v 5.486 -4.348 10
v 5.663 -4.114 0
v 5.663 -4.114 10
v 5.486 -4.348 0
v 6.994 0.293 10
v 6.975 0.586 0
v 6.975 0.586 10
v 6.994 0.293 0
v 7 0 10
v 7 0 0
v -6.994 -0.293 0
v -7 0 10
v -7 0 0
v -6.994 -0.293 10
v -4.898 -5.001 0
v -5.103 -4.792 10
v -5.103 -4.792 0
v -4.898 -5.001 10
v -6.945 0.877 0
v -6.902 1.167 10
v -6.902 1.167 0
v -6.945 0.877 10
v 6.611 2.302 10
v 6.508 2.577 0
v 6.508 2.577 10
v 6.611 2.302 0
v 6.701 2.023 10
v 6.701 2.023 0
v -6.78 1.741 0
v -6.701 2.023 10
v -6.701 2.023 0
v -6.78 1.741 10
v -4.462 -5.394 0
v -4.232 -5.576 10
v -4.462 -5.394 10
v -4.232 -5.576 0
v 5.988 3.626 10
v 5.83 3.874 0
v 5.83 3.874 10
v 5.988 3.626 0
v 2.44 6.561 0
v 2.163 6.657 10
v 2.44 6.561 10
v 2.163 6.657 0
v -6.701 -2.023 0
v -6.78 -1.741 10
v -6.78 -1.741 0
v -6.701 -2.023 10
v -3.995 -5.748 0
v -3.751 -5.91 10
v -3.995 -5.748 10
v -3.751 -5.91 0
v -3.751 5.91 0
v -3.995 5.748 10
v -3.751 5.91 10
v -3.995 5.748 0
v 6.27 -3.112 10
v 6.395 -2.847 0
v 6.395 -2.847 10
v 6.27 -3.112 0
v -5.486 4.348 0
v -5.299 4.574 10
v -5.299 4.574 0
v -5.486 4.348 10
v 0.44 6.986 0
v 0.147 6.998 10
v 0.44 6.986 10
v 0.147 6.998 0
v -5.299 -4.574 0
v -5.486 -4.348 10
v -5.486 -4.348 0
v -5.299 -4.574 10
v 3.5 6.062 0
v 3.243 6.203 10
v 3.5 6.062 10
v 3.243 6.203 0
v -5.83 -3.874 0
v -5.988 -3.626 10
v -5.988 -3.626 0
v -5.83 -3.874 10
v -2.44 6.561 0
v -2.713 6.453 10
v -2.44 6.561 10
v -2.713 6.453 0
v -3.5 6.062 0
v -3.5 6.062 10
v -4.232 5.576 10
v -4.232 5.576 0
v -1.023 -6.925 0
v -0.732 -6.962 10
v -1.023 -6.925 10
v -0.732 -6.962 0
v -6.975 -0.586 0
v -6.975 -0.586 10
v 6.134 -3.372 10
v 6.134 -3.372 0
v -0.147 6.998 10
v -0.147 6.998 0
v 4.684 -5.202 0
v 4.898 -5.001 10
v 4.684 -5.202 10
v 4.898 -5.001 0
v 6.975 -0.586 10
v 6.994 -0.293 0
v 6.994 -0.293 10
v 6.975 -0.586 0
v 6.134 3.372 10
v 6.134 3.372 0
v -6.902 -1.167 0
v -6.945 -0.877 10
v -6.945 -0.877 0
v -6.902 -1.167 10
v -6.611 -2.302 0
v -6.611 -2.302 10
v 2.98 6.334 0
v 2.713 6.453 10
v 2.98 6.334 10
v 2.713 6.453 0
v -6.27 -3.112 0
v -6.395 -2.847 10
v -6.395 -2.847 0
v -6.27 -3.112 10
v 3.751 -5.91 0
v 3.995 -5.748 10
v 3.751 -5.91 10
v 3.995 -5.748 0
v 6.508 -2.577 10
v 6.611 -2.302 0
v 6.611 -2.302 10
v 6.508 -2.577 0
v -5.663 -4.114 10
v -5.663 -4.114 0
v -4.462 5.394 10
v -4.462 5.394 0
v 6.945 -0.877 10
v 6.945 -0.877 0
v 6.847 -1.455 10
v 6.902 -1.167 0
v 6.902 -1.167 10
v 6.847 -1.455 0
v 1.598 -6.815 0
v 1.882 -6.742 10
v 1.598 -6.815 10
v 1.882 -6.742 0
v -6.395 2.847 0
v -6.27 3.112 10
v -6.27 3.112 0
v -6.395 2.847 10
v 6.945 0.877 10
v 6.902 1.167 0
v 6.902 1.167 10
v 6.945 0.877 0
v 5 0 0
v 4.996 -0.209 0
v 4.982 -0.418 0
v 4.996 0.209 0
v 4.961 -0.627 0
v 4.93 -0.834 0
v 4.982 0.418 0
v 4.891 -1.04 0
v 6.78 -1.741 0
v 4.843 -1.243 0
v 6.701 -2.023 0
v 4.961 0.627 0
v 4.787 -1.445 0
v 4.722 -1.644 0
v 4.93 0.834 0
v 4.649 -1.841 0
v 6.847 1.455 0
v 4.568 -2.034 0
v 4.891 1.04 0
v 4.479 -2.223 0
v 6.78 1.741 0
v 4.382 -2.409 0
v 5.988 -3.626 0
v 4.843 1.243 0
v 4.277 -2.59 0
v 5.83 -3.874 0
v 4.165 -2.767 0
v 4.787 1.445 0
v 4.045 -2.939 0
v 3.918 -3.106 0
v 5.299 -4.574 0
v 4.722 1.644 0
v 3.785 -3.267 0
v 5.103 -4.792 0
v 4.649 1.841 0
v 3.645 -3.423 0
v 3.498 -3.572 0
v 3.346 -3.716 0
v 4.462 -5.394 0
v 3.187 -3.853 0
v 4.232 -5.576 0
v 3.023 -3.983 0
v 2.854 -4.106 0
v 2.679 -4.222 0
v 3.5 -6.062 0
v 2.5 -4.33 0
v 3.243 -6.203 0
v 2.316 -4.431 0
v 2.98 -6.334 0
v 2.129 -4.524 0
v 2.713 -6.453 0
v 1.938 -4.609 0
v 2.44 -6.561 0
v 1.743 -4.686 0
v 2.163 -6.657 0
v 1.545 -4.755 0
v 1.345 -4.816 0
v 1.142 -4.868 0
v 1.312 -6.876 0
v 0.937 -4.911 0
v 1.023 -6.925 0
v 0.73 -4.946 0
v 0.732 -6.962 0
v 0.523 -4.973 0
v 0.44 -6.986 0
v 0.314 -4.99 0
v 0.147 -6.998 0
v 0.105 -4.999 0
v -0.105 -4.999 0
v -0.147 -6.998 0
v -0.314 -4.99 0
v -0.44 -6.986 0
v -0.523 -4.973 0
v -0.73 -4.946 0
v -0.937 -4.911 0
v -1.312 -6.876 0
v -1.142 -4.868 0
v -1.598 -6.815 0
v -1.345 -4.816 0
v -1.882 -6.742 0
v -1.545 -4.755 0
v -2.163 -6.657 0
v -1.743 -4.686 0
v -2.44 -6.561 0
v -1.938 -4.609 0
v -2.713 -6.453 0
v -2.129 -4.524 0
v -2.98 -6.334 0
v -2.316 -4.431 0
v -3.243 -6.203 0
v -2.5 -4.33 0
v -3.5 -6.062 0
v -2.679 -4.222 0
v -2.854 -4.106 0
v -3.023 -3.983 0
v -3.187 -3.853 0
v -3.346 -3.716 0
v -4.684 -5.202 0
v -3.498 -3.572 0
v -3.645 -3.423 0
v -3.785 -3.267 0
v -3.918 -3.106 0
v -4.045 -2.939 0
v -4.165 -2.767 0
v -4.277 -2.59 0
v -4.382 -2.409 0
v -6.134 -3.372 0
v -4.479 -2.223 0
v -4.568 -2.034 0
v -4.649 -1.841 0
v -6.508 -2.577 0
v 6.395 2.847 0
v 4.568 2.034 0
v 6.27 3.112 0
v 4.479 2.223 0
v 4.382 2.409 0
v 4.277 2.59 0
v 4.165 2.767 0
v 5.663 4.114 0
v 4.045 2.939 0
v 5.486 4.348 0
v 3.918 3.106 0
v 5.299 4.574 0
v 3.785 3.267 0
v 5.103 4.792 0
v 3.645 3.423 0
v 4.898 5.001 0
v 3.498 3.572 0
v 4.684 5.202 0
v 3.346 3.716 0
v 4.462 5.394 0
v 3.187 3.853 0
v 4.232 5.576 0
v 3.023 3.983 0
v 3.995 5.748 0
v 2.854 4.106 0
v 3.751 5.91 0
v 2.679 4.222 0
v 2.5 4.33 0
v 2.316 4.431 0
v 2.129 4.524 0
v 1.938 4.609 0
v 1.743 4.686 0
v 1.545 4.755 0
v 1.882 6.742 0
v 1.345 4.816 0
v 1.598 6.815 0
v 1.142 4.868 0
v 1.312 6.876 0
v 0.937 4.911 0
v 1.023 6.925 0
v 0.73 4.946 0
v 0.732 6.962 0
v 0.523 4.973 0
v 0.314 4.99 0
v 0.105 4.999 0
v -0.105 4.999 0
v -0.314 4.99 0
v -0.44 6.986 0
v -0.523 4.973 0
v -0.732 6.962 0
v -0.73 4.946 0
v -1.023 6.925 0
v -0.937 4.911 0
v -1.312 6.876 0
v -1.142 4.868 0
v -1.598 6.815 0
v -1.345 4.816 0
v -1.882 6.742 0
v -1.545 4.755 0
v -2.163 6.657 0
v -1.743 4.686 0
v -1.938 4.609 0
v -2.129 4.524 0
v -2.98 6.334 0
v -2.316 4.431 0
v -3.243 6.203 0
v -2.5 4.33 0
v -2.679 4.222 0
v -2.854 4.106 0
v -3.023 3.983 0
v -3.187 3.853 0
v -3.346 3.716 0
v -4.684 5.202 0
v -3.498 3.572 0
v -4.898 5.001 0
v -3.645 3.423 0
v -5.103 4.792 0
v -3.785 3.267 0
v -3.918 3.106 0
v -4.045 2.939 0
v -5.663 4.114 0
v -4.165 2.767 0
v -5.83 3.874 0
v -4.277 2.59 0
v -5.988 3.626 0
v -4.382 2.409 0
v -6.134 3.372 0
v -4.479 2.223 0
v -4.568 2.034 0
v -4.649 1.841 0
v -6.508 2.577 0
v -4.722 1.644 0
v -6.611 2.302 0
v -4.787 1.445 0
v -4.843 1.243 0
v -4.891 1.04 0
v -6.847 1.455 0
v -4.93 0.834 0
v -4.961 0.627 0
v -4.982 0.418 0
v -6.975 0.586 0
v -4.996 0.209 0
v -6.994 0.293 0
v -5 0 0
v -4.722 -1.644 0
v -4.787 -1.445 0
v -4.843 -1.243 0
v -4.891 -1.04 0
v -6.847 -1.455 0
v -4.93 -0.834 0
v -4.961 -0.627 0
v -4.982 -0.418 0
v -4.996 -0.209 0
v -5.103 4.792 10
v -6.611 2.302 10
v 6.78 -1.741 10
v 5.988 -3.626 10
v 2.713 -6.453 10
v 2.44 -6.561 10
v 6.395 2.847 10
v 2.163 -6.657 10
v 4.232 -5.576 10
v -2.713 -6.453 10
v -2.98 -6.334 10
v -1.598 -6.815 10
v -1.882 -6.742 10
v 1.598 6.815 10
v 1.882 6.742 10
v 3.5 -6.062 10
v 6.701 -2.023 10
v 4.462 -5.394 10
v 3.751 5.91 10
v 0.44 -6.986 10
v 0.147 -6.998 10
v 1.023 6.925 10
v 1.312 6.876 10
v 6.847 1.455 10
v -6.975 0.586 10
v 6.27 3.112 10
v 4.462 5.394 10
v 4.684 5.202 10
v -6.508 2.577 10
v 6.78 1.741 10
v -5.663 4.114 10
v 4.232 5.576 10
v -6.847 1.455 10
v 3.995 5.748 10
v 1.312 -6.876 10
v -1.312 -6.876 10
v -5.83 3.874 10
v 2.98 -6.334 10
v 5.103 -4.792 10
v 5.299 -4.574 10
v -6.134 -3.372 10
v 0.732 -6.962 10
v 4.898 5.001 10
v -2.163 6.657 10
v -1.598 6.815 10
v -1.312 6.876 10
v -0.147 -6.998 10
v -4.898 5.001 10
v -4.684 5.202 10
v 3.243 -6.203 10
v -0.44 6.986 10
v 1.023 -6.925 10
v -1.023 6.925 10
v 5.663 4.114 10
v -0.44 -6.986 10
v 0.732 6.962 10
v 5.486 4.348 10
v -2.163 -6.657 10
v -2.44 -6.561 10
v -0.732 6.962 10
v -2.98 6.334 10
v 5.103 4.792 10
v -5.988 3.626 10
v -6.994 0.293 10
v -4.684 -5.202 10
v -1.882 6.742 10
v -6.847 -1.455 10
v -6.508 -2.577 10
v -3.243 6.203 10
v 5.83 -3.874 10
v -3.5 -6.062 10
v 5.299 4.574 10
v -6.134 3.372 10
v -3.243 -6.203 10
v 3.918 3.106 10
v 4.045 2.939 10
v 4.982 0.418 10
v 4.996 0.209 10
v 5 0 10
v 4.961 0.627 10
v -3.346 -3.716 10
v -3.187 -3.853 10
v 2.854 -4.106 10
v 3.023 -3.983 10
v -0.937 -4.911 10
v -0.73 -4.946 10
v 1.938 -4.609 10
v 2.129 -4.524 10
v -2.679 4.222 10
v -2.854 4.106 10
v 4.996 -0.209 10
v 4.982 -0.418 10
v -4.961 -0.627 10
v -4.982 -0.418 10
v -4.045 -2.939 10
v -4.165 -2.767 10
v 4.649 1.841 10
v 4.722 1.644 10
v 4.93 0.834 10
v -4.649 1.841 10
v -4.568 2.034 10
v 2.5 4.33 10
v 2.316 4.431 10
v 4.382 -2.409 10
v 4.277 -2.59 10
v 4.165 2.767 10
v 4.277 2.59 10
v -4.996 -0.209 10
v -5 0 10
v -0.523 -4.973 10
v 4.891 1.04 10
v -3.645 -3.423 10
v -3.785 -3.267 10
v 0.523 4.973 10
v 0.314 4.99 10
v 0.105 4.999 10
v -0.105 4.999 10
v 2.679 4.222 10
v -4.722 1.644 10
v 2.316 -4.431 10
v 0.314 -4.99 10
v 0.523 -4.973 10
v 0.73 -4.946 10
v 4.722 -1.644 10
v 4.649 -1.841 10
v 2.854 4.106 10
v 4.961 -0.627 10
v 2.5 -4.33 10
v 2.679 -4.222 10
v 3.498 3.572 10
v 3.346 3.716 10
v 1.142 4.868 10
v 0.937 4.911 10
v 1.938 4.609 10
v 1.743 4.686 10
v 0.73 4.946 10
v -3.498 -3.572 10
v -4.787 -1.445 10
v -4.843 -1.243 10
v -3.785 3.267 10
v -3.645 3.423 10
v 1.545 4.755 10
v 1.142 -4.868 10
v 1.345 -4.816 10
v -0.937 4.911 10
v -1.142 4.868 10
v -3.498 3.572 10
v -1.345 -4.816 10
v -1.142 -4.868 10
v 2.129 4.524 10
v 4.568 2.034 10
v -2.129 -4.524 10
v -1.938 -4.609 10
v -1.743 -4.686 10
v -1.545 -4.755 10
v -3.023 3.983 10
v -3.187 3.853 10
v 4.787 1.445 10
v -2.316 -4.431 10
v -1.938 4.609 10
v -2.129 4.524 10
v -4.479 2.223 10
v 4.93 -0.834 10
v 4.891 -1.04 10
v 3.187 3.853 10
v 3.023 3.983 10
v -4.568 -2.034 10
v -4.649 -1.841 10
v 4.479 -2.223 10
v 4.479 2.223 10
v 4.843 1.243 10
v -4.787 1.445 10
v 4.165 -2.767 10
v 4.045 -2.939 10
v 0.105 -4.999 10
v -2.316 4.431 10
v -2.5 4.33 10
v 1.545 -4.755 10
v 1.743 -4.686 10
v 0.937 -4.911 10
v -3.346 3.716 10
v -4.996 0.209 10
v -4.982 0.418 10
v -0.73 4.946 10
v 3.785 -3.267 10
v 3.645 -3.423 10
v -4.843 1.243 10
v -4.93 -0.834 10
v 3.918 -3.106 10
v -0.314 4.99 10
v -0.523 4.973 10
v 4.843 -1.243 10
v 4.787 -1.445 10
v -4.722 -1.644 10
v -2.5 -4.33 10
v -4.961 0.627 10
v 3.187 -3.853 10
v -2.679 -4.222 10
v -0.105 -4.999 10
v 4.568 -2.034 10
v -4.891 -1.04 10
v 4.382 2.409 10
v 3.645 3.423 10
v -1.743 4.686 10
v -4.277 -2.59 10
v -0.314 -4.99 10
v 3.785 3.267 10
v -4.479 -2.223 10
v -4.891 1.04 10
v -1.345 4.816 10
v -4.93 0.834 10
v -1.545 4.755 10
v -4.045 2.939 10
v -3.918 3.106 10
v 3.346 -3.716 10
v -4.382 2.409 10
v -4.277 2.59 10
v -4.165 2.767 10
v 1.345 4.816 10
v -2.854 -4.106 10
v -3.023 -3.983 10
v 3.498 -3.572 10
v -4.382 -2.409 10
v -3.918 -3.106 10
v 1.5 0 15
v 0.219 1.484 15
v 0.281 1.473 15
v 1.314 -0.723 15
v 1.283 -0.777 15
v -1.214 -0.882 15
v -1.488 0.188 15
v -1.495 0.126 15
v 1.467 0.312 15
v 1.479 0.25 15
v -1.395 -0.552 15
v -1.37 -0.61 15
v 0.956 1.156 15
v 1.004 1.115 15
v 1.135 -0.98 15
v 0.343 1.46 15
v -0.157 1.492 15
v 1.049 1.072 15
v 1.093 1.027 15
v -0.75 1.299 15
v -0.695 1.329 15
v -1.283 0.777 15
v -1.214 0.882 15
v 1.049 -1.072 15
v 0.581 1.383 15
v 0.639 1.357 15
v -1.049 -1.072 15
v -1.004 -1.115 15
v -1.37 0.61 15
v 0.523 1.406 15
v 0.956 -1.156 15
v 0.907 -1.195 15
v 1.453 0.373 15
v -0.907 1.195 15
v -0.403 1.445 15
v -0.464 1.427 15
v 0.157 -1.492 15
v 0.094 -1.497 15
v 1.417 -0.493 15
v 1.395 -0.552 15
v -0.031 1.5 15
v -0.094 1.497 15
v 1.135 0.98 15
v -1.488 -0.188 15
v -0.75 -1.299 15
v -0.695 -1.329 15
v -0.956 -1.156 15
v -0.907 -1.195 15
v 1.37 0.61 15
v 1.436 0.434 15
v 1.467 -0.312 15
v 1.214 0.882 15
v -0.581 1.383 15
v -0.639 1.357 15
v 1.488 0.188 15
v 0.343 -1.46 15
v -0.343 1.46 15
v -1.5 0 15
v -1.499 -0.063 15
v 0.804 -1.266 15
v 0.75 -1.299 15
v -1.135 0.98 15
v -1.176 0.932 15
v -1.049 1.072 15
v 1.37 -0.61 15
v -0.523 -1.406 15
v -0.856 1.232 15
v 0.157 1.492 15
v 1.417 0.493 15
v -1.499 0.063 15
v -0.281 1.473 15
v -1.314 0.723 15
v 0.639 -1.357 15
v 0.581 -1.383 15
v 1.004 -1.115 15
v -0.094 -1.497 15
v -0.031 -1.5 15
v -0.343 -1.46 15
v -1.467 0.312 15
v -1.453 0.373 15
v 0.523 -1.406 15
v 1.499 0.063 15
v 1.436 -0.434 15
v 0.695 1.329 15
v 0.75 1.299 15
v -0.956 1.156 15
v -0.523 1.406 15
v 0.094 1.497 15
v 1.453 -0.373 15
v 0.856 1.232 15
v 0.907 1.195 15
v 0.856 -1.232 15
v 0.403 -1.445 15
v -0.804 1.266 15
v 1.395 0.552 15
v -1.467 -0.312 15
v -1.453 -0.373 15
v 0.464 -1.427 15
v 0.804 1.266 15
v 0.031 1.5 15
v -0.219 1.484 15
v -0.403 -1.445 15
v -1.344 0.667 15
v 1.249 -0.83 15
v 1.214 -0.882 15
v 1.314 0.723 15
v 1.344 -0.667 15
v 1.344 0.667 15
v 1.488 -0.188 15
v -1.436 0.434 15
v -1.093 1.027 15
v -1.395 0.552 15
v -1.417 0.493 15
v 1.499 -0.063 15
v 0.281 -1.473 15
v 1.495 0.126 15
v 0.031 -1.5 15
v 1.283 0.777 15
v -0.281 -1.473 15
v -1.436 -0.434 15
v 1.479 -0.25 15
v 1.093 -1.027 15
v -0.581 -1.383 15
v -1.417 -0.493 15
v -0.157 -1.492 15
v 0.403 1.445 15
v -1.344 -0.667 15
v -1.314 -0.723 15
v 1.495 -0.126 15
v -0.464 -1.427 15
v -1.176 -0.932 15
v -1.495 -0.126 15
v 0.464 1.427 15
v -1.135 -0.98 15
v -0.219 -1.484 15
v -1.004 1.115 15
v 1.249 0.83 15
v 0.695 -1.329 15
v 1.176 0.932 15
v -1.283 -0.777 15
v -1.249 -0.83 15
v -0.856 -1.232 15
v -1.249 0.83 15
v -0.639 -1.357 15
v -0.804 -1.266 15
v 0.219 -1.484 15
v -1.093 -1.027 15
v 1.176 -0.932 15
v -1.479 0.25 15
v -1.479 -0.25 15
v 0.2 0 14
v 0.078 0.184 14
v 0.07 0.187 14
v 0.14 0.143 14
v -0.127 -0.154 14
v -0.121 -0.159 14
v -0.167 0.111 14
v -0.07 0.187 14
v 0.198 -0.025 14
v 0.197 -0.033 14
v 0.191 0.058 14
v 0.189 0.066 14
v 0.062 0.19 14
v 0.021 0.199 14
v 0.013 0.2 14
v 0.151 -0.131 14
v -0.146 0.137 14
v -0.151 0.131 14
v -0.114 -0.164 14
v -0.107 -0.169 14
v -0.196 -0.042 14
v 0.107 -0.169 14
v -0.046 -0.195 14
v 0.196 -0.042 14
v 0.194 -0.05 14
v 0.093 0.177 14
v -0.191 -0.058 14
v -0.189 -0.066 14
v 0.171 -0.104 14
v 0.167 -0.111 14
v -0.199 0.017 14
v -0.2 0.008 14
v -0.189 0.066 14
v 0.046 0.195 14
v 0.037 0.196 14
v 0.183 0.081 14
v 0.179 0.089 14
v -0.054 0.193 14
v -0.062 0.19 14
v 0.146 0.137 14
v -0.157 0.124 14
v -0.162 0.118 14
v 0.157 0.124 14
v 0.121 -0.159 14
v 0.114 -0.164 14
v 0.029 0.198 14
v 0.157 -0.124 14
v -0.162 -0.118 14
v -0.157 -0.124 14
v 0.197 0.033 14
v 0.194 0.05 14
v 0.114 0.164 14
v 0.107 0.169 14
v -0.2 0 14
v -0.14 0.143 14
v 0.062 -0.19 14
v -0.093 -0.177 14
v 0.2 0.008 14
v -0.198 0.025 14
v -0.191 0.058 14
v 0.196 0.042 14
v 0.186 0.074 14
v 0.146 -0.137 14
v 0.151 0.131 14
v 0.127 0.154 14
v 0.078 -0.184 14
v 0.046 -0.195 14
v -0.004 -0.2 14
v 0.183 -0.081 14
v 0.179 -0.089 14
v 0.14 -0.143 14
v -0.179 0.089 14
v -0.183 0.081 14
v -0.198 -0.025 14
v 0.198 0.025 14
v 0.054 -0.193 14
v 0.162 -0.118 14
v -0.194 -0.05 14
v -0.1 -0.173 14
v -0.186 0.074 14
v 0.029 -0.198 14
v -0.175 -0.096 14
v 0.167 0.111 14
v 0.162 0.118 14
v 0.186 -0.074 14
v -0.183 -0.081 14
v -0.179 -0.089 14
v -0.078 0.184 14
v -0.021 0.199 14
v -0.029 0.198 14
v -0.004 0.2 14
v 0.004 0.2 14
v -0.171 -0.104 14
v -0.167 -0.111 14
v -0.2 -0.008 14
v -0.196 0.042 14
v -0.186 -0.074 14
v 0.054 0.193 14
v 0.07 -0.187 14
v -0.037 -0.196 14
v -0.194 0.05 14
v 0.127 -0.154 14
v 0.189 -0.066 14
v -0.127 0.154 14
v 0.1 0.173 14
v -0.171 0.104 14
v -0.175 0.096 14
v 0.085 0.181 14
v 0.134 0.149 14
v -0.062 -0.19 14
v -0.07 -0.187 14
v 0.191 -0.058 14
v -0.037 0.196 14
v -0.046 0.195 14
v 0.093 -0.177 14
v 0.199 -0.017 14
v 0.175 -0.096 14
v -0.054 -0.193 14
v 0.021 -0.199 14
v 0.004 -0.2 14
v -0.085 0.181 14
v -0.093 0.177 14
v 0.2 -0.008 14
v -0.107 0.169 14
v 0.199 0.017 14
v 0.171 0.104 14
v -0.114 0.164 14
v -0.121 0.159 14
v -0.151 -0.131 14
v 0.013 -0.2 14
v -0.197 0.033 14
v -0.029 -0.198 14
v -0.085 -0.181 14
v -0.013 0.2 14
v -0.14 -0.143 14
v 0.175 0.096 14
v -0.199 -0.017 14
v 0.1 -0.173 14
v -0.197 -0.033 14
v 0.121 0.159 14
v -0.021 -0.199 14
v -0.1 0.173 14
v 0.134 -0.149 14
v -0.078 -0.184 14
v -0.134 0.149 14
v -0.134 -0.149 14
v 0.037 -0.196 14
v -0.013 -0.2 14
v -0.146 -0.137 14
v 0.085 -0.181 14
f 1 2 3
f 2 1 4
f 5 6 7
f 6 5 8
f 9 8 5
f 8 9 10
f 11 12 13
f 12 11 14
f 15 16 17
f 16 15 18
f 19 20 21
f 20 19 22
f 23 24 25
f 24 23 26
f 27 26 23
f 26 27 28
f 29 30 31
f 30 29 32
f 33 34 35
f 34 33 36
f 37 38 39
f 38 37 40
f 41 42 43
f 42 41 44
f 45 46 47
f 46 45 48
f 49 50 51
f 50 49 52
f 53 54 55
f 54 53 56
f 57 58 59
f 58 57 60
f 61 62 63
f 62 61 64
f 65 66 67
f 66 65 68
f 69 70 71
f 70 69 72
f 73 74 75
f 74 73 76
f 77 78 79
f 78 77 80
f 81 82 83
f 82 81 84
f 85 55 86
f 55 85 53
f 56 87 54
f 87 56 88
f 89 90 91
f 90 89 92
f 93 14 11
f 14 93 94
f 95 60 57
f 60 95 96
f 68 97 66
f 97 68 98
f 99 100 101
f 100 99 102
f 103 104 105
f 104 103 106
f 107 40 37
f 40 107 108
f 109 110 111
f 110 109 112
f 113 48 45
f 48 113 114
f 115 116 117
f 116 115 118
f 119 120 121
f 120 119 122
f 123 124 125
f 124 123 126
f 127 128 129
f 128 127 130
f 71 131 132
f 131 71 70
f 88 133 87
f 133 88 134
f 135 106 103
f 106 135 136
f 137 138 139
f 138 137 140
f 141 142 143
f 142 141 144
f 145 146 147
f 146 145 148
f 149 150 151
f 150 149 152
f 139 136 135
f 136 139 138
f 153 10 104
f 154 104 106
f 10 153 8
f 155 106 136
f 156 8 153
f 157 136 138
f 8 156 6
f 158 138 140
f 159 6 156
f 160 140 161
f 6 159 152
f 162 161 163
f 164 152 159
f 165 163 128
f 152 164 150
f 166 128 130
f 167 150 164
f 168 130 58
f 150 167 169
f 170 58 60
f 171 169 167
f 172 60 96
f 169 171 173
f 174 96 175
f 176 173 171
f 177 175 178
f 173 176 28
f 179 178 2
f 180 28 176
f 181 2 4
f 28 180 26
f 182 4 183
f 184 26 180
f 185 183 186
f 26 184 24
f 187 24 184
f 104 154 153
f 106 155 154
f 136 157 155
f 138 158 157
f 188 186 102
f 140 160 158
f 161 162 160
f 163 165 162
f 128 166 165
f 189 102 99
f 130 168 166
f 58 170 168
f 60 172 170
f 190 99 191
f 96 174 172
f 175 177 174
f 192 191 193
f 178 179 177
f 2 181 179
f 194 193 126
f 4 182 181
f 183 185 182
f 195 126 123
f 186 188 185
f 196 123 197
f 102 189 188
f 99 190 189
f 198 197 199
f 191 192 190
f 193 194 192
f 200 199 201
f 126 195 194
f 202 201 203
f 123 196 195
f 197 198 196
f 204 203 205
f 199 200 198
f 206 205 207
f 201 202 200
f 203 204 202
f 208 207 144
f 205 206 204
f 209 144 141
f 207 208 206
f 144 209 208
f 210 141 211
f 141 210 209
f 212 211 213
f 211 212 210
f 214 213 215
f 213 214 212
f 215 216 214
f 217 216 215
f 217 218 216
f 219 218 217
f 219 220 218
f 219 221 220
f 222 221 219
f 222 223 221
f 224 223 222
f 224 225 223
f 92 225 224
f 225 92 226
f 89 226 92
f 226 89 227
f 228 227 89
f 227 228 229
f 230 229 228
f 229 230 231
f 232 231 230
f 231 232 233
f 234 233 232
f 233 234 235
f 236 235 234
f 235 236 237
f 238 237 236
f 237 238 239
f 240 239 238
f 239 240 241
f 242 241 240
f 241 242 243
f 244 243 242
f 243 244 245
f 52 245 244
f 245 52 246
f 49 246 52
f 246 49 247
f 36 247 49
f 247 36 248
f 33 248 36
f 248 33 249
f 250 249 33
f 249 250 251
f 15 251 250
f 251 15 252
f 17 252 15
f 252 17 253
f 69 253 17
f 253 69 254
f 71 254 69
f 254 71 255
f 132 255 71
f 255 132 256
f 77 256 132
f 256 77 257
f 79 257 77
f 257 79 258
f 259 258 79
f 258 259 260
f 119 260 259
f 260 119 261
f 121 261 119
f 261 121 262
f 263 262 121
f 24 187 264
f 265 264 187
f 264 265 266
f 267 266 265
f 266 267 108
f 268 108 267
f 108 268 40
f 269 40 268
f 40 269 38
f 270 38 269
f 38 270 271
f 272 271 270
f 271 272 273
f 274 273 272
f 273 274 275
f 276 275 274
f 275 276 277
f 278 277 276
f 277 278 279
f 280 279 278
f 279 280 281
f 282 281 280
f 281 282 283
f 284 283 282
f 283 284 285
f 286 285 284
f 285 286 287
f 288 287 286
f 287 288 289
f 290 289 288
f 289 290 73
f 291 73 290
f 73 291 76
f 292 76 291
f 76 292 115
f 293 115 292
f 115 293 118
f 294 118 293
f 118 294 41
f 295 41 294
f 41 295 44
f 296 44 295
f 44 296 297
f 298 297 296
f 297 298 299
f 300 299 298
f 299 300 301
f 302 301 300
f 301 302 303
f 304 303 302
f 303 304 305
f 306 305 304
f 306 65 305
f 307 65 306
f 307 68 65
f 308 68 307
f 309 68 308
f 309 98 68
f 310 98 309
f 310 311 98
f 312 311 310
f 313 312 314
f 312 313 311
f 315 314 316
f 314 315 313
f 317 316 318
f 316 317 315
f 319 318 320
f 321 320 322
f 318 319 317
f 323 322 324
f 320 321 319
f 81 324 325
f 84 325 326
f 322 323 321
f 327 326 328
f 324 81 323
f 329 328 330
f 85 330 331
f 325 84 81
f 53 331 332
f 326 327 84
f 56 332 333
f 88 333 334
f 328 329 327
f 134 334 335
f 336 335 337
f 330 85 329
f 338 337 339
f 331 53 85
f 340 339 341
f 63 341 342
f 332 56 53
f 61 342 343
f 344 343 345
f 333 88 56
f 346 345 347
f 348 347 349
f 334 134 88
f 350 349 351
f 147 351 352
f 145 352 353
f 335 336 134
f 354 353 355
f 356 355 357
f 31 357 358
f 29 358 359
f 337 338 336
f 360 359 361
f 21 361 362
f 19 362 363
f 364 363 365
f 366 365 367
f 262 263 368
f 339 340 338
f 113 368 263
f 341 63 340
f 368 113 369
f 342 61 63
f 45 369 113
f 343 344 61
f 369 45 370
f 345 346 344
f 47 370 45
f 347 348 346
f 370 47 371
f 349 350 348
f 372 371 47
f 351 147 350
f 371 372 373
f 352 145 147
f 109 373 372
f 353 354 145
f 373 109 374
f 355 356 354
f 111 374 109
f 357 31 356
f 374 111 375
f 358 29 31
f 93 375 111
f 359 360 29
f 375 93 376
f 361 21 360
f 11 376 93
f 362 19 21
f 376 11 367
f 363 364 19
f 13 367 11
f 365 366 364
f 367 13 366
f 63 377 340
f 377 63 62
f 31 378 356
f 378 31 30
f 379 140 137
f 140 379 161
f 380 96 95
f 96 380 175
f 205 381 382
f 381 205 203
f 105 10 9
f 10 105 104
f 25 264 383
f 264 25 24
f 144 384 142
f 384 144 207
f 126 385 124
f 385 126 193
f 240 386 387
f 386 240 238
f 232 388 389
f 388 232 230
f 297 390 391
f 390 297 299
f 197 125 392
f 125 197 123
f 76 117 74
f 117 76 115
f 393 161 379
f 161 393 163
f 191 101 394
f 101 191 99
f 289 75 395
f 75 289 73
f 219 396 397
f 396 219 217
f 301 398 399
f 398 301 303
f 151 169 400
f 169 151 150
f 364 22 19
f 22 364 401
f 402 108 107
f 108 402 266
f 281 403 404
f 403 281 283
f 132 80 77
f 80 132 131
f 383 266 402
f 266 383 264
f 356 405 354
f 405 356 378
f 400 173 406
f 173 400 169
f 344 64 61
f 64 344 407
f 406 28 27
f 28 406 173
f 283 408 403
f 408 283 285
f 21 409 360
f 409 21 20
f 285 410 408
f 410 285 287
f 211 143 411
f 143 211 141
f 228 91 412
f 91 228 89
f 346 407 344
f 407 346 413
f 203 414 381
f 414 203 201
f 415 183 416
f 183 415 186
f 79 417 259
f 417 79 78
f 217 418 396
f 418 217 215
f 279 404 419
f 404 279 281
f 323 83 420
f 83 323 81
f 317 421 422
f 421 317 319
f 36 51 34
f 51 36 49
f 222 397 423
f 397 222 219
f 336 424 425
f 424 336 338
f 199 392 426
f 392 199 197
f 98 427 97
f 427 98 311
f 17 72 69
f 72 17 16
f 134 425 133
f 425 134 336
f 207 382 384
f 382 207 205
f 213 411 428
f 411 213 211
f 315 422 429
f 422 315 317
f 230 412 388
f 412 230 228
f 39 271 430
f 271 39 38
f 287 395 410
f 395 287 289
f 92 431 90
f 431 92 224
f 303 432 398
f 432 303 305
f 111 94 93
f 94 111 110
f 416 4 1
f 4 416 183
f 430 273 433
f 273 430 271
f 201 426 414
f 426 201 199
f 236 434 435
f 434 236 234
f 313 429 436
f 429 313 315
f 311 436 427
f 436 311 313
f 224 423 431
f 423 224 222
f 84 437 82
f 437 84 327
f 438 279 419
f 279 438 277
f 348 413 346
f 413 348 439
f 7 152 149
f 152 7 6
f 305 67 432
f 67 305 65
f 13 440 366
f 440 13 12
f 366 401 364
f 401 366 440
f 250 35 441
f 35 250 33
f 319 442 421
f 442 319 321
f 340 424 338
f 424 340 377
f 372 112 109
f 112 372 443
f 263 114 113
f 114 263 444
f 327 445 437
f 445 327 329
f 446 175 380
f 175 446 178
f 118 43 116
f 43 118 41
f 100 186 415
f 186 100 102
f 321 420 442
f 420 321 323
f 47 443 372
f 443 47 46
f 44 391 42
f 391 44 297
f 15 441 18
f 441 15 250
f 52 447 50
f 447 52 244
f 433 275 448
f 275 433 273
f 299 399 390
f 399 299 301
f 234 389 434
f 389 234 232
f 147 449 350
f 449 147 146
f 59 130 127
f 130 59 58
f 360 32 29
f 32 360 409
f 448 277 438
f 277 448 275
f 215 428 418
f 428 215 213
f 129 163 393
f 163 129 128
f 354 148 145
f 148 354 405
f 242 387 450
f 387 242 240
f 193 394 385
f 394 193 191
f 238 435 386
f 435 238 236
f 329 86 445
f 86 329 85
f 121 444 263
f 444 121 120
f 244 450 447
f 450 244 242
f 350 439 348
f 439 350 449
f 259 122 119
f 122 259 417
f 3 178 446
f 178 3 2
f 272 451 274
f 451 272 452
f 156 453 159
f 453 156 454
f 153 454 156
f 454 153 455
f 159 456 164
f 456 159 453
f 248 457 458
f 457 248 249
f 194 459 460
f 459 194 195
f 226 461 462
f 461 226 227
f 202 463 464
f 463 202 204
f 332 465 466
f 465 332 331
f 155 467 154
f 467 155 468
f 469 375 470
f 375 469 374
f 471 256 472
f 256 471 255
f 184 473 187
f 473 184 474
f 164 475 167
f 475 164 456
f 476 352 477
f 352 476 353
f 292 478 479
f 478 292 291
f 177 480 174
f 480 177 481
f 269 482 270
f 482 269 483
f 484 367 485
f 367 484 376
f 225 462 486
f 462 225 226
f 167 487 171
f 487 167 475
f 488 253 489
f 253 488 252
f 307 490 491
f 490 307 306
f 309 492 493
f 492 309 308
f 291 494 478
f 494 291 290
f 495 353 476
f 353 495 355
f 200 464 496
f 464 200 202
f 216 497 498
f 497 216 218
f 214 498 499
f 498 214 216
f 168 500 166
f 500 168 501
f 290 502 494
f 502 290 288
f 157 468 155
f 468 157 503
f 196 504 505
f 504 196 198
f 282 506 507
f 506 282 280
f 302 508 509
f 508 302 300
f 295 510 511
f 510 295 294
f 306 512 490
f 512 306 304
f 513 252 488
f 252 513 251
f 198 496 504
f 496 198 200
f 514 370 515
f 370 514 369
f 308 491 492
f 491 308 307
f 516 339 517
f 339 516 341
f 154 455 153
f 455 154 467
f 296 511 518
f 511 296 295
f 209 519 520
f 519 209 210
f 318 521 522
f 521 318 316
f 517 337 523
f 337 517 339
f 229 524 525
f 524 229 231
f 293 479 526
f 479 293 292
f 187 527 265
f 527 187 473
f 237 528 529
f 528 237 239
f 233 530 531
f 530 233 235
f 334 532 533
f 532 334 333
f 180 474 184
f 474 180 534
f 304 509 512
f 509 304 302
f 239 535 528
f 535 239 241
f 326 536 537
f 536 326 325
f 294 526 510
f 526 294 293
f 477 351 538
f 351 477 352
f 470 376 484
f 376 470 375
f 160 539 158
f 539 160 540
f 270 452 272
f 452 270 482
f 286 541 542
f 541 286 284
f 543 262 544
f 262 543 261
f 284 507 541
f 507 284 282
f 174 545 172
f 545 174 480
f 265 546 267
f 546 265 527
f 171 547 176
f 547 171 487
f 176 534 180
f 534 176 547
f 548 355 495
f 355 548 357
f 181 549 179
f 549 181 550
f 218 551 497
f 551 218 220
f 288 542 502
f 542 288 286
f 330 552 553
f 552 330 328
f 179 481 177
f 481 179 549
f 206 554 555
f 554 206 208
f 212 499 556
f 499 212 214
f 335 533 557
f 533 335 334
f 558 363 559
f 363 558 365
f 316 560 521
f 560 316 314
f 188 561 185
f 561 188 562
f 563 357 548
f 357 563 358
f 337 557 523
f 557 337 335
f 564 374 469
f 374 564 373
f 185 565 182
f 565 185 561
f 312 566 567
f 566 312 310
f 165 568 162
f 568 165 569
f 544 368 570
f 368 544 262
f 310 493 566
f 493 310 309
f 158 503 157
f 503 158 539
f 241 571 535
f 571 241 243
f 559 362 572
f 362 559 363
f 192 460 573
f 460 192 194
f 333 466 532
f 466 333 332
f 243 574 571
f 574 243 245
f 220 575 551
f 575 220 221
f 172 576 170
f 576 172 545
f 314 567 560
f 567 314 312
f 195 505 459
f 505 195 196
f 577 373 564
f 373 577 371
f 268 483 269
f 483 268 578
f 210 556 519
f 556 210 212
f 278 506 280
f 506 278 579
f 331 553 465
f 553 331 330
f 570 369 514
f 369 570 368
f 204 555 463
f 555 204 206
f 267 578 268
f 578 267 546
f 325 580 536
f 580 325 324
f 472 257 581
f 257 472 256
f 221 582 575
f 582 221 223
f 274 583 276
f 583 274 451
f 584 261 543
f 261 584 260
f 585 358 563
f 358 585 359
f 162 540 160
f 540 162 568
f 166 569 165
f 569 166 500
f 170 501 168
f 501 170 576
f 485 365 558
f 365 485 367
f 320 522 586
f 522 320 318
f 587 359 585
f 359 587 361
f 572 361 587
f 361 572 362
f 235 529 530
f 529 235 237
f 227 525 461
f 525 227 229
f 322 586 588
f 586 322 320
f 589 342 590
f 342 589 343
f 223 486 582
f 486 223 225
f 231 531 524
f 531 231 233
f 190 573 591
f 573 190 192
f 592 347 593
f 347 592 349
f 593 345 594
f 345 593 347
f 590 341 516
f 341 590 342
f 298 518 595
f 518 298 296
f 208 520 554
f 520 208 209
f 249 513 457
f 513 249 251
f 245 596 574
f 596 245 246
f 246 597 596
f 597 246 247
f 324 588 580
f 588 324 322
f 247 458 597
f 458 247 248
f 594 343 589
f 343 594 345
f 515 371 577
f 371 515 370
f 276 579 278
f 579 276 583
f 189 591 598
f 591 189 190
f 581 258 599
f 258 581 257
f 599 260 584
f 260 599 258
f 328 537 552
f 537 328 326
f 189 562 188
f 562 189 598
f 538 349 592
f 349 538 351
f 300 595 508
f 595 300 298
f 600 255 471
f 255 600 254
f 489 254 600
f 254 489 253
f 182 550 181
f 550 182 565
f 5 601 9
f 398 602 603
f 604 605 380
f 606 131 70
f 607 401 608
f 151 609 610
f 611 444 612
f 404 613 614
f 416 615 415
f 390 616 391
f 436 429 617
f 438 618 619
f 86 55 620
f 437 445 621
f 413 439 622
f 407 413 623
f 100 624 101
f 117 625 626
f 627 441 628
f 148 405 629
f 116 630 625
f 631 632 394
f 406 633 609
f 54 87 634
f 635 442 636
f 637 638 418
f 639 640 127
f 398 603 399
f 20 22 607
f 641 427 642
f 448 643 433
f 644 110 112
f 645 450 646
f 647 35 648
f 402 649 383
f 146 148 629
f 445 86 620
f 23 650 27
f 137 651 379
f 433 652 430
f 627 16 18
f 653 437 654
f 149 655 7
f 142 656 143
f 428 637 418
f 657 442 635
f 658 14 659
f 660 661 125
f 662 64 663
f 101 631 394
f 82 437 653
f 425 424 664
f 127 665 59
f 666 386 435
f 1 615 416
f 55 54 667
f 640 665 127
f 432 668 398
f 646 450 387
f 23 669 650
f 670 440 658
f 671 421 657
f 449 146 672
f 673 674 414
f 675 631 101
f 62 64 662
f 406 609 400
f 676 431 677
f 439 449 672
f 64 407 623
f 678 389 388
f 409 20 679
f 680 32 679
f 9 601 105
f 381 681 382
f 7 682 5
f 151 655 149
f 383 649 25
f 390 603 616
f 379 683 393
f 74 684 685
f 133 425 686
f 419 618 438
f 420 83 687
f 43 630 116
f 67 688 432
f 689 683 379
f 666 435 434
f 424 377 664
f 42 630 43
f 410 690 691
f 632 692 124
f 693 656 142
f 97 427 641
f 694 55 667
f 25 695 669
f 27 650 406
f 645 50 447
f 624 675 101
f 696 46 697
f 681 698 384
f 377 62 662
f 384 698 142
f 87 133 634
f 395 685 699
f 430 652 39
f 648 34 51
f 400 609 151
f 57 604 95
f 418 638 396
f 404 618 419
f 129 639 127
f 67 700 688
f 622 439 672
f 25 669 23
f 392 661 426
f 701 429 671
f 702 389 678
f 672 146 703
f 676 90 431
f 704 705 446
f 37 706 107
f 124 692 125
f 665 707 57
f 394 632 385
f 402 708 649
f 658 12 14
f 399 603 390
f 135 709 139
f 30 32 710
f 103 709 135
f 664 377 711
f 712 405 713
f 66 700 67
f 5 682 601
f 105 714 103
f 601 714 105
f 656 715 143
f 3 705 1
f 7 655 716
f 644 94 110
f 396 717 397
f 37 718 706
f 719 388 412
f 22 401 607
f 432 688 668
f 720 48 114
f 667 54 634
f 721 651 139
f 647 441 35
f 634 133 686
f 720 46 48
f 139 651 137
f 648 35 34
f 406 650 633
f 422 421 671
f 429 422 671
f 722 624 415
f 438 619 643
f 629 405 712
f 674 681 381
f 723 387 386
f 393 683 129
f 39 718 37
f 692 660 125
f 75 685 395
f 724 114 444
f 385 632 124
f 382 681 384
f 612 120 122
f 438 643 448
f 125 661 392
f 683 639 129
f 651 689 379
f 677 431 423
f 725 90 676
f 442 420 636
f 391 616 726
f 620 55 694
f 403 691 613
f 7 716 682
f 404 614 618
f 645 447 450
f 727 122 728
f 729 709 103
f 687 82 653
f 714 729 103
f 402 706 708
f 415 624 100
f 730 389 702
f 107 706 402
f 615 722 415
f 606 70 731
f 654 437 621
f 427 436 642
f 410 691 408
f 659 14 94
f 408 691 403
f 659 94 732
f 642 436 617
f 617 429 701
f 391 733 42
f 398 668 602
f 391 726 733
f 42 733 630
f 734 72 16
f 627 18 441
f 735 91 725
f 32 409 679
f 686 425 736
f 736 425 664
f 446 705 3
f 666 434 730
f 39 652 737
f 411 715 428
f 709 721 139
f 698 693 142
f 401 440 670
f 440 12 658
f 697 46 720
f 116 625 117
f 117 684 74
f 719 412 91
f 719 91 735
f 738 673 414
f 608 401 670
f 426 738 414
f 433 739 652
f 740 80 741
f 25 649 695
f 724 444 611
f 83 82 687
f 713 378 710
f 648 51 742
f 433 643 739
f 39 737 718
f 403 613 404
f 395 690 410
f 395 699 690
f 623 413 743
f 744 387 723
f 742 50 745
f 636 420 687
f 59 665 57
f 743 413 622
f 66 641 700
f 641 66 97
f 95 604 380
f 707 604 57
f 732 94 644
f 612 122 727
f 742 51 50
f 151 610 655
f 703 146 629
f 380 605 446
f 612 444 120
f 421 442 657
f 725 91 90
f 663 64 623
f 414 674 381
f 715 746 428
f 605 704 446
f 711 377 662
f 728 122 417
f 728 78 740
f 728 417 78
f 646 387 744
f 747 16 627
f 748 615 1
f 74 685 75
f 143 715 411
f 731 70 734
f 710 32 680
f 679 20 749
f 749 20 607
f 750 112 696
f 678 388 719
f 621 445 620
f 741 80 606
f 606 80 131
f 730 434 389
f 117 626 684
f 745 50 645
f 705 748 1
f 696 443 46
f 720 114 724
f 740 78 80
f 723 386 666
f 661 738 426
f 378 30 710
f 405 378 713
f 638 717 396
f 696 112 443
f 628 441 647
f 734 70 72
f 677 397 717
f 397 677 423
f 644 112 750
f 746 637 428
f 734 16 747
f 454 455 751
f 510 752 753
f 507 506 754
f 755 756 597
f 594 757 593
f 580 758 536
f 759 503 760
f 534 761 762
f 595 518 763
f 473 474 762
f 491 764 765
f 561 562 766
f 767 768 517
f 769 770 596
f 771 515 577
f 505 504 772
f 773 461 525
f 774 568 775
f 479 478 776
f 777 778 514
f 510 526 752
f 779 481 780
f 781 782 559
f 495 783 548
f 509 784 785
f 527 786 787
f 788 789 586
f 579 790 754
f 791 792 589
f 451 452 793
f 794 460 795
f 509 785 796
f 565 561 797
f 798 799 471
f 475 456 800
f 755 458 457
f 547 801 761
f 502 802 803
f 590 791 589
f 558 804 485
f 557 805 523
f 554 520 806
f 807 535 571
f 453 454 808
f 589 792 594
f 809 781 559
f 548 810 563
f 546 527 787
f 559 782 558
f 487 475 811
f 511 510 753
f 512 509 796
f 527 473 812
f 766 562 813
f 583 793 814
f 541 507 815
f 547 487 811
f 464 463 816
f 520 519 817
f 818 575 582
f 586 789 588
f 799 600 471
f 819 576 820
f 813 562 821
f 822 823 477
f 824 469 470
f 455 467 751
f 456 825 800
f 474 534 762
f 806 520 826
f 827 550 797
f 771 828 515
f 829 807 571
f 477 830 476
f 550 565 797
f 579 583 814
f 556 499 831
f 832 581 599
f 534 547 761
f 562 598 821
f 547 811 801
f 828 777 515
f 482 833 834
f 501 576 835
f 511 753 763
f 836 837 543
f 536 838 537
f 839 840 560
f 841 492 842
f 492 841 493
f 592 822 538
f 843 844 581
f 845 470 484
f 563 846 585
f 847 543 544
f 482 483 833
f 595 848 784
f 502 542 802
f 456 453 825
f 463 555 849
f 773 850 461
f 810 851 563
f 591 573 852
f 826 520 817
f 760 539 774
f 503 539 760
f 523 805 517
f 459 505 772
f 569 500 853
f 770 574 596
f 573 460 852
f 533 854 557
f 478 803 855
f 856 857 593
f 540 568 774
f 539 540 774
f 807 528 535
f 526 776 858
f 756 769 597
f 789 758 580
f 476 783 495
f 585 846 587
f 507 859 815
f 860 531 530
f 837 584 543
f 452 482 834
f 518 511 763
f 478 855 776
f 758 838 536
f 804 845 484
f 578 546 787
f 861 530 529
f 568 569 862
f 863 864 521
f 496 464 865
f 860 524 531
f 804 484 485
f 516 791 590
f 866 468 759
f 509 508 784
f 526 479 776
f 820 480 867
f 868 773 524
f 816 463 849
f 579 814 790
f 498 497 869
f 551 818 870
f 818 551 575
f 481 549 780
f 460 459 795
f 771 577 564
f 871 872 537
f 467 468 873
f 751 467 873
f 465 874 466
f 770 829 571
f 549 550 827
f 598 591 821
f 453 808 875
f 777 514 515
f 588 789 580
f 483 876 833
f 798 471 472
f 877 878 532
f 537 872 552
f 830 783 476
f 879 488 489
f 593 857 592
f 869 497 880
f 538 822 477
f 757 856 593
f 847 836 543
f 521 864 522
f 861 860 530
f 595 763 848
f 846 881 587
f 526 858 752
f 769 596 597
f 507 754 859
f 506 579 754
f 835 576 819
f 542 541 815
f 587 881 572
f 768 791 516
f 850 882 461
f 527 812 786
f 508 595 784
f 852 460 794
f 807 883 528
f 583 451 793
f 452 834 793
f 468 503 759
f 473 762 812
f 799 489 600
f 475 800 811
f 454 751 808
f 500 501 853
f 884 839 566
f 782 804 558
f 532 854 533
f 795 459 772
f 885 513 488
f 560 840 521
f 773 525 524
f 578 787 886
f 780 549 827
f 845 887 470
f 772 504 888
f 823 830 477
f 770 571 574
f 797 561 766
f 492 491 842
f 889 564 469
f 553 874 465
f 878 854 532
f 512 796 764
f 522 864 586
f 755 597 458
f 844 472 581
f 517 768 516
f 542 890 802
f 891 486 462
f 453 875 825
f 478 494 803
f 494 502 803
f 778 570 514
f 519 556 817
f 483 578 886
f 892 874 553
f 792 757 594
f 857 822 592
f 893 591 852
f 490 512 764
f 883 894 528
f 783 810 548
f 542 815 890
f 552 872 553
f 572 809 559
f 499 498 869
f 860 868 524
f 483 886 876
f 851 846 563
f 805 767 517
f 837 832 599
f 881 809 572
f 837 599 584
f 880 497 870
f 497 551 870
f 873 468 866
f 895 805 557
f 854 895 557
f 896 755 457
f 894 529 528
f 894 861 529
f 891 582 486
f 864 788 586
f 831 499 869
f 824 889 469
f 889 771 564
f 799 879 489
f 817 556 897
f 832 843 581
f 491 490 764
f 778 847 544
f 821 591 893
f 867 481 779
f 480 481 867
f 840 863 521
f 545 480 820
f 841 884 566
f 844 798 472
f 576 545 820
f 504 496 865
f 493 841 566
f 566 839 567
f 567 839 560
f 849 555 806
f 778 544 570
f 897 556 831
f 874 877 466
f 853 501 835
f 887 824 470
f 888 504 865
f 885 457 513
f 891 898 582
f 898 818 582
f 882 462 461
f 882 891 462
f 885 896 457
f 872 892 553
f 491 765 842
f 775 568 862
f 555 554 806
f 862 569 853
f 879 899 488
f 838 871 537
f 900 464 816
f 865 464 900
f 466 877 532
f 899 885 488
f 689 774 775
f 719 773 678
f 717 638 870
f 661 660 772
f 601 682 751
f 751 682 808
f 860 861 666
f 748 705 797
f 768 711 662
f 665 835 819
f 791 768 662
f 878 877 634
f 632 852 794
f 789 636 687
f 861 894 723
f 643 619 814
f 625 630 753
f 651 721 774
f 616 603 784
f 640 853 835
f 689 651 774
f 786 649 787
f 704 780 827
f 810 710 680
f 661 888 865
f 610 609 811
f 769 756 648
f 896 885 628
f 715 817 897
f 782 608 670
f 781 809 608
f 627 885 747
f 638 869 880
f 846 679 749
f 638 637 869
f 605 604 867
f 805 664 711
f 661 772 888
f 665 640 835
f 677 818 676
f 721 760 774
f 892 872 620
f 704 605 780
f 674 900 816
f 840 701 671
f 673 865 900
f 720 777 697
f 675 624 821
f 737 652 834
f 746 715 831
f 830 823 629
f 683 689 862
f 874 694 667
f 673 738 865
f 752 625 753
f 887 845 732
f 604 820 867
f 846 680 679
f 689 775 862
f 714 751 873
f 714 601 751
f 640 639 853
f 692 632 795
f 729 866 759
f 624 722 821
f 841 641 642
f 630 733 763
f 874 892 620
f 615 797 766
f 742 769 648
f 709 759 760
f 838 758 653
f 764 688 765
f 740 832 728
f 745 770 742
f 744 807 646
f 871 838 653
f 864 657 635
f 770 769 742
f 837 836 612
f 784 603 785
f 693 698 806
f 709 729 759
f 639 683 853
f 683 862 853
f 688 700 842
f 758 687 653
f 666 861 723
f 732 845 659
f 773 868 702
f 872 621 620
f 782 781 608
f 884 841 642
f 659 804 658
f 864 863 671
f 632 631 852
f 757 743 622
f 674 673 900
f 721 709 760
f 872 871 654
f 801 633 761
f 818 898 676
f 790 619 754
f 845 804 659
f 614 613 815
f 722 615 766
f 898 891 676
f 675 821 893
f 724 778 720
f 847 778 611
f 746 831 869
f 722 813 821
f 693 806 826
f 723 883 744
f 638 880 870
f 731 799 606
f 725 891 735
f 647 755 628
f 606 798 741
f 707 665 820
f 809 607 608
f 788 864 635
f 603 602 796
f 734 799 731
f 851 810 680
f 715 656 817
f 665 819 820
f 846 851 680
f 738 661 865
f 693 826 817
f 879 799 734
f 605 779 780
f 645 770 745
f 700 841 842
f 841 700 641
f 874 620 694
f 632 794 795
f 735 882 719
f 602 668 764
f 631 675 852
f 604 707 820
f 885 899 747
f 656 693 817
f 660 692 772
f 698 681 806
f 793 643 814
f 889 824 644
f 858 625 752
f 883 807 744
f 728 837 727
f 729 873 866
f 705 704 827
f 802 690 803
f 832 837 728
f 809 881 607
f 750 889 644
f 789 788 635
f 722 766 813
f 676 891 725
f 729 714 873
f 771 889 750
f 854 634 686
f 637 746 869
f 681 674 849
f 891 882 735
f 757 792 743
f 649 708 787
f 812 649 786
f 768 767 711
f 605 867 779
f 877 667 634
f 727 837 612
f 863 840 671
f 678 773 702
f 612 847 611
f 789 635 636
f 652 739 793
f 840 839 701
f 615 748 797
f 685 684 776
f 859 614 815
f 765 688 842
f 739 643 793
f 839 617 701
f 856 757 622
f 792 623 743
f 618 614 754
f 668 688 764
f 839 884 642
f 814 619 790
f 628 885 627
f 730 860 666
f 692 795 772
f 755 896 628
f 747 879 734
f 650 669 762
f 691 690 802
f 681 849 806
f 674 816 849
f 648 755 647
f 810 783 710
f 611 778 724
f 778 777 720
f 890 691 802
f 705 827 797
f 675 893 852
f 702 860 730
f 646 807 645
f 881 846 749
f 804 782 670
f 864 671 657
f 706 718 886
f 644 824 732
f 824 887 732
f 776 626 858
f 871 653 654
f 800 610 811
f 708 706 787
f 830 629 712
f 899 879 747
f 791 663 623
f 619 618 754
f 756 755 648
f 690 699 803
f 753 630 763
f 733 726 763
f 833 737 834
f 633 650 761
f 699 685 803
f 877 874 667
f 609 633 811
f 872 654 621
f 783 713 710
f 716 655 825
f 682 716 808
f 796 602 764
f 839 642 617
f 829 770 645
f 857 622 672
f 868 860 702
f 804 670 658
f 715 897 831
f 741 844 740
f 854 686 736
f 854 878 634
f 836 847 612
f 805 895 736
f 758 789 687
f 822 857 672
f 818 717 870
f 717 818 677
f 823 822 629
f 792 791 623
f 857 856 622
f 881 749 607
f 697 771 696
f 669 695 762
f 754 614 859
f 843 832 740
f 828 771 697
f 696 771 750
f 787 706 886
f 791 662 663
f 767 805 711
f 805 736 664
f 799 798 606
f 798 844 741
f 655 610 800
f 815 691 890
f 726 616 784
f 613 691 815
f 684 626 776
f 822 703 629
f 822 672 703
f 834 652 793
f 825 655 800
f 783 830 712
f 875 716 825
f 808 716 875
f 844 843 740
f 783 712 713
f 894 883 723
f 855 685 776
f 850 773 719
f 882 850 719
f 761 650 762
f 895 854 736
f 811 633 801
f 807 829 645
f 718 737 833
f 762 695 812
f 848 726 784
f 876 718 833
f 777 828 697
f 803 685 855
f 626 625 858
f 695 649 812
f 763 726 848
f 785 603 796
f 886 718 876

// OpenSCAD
/**
 * Spray nozzle.
 */

$fn=150;

// Total diameter of the base
d_total = 14;
// Diameter of the base hole (diameter of tube)
d_hole = 10;
// Diameter of the nozzle hole
d_output_inner = 0.4;
// Diameter of the nozzle output
d_output_outer = 3;
// Height of the base
h_base = 10;
// Height of the top part
h_top = 5;

module base() {
    difference() {
        cylinder(d=d_total, h=h_base);
        cylinder(d=d_hole, h=h_base);
    }
}

module top() {
    difference() {
        // Outer cone
        cylinder(d1=d_total, d2=d_output_outer, h=h_top);
        // Inner cone
        cylinder(d1=d_hole, d2=d_output_inner, h=h_top-1);
        translate([0, 0, h_top-1])
            cylinder(d1=d_output_inner, d2=d_output_outer, h=1); // Nozzle
    }
}

union() {
    base();
    translate([0, 0, h_base]) {
        top();
    }
}
